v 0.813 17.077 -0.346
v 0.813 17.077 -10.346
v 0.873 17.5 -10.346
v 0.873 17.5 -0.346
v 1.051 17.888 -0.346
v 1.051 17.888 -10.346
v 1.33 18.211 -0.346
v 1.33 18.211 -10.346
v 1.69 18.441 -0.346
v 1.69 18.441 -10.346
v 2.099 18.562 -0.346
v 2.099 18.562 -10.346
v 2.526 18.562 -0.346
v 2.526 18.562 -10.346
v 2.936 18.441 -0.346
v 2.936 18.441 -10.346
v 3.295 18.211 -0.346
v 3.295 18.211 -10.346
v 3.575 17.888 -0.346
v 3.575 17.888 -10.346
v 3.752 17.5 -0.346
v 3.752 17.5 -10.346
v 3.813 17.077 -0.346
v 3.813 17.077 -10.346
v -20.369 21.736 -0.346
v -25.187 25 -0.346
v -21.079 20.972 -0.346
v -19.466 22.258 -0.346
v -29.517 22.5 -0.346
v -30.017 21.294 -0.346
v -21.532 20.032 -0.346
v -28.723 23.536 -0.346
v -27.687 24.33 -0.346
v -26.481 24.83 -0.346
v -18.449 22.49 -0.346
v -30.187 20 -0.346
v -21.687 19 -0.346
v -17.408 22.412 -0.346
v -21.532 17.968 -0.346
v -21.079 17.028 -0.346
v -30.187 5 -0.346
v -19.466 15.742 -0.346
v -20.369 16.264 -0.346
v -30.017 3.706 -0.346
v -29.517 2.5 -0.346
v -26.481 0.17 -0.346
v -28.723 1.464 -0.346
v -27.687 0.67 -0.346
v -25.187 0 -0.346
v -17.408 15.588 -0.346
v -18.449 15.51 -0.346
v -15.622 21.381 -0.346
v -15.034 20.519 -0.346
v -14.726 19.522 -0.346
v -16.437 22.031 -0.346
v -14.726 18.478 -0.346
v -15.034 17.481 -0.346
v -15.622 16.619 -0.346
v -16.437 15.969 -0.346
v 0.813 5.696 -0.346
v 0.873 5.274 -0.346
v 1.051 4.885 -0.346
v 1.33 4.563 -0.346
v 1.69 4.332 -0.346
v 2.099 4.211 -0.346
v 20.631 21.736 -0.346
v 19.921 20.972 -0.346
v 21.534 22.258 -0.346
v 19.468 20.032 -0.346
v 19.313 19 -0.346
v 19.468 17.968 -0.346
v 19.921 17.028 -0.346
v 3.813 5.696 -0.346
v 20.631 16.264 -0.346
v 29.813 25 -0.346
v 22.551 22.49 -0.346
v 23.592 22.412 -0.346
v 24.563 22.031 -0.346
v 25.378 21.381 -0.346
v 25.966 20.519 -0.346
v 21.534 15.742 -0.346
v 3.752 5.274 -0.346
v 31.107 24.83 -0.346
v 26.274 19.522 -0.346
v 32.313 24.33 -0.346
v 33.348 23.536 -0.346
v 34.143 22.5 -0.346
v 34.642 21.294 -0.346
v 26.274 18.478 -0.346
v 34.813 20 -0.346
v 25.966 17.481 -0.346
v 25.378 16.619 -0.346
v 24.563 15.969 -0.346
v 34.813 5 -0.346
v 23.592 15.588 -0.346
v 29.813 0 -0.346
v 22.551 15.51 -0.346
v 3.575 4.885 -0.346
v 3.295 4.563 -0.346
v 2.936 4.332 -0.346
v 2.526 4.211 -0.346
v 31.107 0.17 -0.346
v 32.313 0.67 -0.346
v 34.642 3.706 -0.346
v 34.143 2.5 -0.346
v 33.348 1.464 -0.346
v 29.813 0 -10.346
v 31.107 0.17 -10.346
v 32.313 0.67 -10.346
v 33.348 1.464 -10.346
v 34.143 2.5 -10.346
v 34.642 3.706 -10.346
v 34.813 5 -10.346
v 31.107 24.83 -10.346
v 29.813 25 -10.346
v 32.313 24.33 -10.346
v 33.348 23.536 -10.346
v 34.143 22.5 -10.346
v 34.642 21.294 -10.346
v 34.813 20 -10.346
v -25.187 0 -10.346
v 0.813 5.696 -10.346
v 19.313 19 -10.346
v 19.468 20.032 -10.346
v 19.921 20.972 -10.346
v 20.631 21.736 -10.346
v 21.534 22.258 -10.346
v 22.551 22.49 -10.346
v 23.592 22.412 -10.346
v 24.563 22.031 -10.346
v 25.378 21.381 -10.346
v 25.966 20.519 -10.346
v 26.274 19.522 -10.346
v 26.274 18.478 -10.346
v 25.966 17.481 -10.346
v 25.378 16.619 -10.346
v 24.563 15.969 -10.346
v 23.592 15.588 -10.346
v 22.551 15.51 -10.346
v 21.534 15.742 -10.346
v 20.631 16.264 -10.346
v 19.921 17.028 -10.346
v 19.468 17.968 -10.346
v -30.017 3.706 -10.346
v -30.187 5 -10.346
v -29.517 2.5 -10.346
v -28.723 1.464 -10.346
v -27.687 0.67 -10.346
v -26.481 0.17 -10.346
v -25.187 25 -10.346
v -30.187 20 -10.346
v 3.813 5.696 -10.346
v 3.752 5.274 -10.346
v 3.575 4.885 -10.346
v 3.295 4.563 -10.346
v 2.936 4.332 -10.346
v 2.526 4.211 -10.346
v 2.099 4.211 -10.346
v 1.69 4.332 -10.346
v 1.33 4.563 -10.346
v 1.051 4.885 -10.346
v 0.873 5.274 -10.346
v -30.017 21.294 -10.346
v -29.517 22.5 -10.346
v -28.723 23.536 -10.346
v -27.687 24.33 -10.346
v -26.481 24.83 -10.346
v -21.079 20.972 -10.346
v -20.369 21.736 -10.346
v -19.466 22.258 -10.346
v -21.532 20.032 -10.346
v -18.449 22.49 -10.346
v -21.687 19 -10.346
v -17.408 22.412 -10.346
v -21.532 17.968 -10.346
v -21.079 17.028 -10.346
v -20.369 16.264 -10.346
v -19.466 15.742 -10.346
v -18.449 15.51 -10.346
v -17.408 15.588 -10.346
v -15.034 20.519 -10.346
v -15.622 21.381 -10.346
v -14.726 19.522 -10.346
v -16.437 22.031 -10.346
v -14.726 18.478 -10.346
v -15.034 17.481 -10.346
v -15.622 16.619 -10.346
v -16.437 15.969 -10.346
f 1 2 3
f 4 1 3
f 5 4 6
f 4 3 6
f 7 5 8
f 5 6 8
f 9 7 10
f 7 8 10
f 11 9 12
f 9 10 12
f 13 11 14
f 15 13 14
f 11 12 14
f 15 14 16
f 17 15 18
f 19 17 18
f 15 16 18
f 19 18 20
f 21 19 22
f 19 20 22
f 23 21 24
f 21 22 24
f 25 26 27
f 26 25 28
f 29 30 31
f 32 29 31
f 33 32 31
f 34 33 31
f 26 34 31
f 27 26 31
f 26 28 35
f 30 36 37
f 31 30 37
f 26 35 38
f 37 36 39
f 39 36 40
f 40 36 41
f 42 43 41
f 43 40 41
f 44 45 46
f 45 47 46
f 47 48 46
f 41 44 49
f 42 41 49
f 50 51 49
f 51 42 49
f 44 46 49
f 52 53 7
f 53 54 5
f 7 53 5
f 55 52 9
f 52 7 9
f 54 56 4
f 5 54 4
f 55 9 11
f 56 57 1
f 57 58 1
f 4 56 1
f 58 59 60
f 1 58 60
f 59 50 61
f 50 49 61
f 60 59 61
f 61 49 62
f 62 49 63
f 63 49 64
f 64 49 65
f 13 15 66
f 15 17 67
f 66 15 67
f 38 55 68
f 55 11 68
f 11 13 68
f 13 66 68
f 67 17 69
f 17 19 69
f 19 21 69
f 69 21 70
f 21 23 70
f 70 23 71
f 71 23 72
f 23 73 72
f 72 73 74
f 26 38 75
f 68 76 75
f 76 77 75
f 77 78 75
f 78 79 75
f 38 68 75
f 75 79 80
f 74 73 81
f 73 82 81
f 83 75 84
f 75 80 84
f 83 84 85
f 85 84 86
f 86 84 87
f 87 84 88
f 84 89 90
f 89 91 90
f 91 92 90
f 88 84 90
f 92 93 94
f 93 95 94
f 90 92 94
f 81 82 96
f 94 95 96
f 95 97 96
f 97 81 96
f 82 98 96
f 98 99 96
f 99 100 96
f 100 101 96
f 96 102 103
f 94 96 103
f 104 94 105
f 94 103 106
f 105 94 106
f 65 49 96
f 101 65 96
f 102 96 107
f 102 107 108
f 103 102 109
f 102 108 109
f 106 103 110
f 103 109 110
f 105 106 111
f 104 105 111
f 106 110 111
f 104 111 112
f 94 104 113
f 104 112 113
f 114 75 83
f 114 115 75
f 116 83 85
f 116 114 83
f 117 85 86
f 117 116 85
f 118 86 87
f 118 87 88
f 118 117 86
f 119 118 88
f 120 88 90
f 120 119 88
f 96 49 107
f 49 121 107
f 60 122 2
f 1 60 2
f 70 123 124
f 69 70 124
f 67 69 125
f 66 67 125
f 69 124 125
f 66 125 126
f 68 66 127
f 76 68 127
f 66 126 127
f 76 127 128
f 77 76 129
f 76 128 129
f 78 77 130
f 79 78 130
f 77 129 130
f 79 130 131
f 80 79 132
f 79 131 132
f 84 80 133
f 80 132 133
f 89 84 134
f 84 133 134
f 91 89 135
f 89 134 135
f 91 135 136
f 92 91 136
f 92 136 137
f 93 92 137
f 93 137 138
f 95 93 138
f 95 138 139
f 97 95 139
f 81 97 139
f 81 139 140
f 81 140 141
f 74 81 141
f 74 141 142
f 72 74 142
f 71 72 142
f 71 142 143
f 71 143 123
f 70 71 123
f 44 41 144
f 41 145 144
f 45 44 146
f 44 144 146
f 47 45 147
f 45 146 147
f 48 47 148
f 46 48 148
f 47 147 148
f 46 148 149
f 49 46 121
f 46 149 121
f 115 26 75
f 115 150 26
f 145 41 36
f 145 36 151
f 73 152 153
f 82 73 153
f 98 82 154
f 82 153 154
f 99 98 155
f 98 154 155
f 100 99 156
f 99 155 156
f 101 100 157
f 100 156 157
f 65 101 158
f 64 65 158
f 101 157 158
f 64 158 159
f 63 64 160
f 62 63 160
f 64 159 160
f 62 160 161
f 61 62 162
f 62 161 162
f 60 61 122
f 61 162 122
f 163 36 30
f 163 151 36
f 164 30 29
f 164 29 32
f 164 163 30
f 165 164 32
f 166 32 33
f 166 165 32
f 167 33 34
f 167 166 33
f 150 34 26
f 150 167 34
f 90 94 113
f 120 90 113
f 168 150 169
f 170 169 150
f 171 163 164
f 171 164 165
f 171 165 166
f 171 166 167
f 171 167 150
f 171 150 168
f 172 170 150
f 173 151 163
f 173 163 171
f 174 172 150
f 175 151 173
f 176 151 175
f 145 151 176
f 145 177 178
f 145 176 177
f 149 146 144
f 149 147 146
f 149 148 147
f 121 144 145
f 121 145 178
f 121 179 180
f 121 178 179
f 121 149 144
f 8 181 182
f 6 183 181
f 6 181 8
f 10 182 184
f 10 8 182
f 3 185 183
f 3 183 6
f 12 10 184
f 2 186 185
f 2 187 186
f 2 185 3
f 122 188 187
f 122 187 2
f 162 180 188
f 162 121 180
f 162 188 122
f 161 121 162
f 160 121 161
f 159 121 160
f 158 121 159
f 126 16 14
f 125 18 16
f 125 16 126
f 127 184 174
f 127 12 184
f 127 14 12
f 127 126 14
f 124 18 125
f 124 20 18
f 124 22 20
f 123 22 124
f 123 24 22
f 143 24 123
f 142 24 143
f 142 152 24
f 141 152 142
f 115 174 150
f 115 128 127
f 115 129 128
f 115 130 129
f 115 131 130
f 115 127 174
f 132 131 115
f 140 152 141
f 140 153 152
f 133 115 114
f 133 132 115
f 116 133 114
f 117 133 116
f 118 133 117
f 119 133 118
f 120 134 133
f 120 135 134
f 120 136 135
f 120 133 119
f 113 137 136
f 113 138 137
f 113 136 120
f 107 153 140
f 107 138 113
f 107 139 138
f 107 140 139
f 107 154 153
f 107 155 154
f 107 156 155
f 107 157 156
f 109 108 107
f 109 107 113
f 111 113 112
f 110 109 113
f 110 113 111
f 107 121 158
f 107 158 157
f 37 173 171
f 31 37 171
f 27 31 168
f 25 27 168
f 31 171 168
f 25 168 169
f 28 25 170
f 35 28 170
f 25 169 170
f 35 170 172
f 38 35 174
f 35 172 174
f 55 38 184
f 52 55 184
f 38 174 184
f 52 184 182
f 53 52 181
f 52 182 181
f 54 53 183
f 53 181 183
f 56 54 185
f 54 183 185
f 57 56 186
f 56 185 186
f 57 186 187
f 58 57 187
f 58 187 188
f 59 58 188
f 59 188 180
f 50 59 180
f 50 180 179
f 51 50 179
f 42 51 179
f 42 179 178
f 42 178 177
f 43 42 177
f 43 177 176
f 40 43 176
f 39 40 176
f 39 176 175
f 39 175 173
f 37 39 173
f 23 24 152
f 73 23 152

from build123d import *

# Parameters (mm, degrees)
SKETCH1_W           = 65
SKETCH1_H           = 10
BOSS_EXTRUDE1_DEPTH = 25
SKETCH2_R           = 3.5
CUT_EXTRUDE1_DEPTH  = 25
FILLET1_R           = 5


with BuildPart() as part:
    # Sketch1 → Boss-Extrude1 (new body)
    with BuildSketch(Plane(origin=(0, 0, 0), x_dir=(1, 0, 0), z_dir=(0, 1, 0))):
        with Locations((2.312734082, 5.346441948)):
            Rectangle(SKETCH1_W, SKETCH1_H)
    extrude(amount=BOSS_EXTRUDE1_DEPTH)

    # Sketch2 → Cut-Extrude1 (cut)
    with BuildSketch(Plane(origin=(0, 0, -10.346441948), x_dir=(-1, 0, 0), z_dir=(0, 0, -1))):
        with Locations((18.187265918, 19)):
            Circle(SKETCH2_R)
        with BuildLine():
            Line((-3.812734082, 17.077006126), (-3.812734082, 5.696172333))
            ThreePointArc((-3.812734082, 5.696172333), (-2.312734082, 4.196172333), (-0.812734082, 5.696172333))
            Line((-0.812734082, 5.696172333), (-0.812734082, 17.077006126))
            ThreePointArc((-0.812734082, 17.077006126), (-2.312734082, 18.577006126), (-3.812734082, 17.077006126))
        make_face()
        with Locations((-22.812734082, 19)):
            Circle(SKETCH2_R)
    extrude(amount=-CUT_EXTRUDE1_DEPTH, mode=Mode.SUBTRACT)

    # Fillet1
    fillet1_edges = [part.edges().sort_by_distance(p)[0] for p in [
        (34.812734082, 25, -5.346441948),
        (-30.187265918, 25, -5.346441948),
        (34.812734082, 0, -5.346441948),
        (-30.187265918, 0, -5.346441948),
    ]]
    fillet(fillet1_edges, radius=FILLET1_R)


solid = part.part
